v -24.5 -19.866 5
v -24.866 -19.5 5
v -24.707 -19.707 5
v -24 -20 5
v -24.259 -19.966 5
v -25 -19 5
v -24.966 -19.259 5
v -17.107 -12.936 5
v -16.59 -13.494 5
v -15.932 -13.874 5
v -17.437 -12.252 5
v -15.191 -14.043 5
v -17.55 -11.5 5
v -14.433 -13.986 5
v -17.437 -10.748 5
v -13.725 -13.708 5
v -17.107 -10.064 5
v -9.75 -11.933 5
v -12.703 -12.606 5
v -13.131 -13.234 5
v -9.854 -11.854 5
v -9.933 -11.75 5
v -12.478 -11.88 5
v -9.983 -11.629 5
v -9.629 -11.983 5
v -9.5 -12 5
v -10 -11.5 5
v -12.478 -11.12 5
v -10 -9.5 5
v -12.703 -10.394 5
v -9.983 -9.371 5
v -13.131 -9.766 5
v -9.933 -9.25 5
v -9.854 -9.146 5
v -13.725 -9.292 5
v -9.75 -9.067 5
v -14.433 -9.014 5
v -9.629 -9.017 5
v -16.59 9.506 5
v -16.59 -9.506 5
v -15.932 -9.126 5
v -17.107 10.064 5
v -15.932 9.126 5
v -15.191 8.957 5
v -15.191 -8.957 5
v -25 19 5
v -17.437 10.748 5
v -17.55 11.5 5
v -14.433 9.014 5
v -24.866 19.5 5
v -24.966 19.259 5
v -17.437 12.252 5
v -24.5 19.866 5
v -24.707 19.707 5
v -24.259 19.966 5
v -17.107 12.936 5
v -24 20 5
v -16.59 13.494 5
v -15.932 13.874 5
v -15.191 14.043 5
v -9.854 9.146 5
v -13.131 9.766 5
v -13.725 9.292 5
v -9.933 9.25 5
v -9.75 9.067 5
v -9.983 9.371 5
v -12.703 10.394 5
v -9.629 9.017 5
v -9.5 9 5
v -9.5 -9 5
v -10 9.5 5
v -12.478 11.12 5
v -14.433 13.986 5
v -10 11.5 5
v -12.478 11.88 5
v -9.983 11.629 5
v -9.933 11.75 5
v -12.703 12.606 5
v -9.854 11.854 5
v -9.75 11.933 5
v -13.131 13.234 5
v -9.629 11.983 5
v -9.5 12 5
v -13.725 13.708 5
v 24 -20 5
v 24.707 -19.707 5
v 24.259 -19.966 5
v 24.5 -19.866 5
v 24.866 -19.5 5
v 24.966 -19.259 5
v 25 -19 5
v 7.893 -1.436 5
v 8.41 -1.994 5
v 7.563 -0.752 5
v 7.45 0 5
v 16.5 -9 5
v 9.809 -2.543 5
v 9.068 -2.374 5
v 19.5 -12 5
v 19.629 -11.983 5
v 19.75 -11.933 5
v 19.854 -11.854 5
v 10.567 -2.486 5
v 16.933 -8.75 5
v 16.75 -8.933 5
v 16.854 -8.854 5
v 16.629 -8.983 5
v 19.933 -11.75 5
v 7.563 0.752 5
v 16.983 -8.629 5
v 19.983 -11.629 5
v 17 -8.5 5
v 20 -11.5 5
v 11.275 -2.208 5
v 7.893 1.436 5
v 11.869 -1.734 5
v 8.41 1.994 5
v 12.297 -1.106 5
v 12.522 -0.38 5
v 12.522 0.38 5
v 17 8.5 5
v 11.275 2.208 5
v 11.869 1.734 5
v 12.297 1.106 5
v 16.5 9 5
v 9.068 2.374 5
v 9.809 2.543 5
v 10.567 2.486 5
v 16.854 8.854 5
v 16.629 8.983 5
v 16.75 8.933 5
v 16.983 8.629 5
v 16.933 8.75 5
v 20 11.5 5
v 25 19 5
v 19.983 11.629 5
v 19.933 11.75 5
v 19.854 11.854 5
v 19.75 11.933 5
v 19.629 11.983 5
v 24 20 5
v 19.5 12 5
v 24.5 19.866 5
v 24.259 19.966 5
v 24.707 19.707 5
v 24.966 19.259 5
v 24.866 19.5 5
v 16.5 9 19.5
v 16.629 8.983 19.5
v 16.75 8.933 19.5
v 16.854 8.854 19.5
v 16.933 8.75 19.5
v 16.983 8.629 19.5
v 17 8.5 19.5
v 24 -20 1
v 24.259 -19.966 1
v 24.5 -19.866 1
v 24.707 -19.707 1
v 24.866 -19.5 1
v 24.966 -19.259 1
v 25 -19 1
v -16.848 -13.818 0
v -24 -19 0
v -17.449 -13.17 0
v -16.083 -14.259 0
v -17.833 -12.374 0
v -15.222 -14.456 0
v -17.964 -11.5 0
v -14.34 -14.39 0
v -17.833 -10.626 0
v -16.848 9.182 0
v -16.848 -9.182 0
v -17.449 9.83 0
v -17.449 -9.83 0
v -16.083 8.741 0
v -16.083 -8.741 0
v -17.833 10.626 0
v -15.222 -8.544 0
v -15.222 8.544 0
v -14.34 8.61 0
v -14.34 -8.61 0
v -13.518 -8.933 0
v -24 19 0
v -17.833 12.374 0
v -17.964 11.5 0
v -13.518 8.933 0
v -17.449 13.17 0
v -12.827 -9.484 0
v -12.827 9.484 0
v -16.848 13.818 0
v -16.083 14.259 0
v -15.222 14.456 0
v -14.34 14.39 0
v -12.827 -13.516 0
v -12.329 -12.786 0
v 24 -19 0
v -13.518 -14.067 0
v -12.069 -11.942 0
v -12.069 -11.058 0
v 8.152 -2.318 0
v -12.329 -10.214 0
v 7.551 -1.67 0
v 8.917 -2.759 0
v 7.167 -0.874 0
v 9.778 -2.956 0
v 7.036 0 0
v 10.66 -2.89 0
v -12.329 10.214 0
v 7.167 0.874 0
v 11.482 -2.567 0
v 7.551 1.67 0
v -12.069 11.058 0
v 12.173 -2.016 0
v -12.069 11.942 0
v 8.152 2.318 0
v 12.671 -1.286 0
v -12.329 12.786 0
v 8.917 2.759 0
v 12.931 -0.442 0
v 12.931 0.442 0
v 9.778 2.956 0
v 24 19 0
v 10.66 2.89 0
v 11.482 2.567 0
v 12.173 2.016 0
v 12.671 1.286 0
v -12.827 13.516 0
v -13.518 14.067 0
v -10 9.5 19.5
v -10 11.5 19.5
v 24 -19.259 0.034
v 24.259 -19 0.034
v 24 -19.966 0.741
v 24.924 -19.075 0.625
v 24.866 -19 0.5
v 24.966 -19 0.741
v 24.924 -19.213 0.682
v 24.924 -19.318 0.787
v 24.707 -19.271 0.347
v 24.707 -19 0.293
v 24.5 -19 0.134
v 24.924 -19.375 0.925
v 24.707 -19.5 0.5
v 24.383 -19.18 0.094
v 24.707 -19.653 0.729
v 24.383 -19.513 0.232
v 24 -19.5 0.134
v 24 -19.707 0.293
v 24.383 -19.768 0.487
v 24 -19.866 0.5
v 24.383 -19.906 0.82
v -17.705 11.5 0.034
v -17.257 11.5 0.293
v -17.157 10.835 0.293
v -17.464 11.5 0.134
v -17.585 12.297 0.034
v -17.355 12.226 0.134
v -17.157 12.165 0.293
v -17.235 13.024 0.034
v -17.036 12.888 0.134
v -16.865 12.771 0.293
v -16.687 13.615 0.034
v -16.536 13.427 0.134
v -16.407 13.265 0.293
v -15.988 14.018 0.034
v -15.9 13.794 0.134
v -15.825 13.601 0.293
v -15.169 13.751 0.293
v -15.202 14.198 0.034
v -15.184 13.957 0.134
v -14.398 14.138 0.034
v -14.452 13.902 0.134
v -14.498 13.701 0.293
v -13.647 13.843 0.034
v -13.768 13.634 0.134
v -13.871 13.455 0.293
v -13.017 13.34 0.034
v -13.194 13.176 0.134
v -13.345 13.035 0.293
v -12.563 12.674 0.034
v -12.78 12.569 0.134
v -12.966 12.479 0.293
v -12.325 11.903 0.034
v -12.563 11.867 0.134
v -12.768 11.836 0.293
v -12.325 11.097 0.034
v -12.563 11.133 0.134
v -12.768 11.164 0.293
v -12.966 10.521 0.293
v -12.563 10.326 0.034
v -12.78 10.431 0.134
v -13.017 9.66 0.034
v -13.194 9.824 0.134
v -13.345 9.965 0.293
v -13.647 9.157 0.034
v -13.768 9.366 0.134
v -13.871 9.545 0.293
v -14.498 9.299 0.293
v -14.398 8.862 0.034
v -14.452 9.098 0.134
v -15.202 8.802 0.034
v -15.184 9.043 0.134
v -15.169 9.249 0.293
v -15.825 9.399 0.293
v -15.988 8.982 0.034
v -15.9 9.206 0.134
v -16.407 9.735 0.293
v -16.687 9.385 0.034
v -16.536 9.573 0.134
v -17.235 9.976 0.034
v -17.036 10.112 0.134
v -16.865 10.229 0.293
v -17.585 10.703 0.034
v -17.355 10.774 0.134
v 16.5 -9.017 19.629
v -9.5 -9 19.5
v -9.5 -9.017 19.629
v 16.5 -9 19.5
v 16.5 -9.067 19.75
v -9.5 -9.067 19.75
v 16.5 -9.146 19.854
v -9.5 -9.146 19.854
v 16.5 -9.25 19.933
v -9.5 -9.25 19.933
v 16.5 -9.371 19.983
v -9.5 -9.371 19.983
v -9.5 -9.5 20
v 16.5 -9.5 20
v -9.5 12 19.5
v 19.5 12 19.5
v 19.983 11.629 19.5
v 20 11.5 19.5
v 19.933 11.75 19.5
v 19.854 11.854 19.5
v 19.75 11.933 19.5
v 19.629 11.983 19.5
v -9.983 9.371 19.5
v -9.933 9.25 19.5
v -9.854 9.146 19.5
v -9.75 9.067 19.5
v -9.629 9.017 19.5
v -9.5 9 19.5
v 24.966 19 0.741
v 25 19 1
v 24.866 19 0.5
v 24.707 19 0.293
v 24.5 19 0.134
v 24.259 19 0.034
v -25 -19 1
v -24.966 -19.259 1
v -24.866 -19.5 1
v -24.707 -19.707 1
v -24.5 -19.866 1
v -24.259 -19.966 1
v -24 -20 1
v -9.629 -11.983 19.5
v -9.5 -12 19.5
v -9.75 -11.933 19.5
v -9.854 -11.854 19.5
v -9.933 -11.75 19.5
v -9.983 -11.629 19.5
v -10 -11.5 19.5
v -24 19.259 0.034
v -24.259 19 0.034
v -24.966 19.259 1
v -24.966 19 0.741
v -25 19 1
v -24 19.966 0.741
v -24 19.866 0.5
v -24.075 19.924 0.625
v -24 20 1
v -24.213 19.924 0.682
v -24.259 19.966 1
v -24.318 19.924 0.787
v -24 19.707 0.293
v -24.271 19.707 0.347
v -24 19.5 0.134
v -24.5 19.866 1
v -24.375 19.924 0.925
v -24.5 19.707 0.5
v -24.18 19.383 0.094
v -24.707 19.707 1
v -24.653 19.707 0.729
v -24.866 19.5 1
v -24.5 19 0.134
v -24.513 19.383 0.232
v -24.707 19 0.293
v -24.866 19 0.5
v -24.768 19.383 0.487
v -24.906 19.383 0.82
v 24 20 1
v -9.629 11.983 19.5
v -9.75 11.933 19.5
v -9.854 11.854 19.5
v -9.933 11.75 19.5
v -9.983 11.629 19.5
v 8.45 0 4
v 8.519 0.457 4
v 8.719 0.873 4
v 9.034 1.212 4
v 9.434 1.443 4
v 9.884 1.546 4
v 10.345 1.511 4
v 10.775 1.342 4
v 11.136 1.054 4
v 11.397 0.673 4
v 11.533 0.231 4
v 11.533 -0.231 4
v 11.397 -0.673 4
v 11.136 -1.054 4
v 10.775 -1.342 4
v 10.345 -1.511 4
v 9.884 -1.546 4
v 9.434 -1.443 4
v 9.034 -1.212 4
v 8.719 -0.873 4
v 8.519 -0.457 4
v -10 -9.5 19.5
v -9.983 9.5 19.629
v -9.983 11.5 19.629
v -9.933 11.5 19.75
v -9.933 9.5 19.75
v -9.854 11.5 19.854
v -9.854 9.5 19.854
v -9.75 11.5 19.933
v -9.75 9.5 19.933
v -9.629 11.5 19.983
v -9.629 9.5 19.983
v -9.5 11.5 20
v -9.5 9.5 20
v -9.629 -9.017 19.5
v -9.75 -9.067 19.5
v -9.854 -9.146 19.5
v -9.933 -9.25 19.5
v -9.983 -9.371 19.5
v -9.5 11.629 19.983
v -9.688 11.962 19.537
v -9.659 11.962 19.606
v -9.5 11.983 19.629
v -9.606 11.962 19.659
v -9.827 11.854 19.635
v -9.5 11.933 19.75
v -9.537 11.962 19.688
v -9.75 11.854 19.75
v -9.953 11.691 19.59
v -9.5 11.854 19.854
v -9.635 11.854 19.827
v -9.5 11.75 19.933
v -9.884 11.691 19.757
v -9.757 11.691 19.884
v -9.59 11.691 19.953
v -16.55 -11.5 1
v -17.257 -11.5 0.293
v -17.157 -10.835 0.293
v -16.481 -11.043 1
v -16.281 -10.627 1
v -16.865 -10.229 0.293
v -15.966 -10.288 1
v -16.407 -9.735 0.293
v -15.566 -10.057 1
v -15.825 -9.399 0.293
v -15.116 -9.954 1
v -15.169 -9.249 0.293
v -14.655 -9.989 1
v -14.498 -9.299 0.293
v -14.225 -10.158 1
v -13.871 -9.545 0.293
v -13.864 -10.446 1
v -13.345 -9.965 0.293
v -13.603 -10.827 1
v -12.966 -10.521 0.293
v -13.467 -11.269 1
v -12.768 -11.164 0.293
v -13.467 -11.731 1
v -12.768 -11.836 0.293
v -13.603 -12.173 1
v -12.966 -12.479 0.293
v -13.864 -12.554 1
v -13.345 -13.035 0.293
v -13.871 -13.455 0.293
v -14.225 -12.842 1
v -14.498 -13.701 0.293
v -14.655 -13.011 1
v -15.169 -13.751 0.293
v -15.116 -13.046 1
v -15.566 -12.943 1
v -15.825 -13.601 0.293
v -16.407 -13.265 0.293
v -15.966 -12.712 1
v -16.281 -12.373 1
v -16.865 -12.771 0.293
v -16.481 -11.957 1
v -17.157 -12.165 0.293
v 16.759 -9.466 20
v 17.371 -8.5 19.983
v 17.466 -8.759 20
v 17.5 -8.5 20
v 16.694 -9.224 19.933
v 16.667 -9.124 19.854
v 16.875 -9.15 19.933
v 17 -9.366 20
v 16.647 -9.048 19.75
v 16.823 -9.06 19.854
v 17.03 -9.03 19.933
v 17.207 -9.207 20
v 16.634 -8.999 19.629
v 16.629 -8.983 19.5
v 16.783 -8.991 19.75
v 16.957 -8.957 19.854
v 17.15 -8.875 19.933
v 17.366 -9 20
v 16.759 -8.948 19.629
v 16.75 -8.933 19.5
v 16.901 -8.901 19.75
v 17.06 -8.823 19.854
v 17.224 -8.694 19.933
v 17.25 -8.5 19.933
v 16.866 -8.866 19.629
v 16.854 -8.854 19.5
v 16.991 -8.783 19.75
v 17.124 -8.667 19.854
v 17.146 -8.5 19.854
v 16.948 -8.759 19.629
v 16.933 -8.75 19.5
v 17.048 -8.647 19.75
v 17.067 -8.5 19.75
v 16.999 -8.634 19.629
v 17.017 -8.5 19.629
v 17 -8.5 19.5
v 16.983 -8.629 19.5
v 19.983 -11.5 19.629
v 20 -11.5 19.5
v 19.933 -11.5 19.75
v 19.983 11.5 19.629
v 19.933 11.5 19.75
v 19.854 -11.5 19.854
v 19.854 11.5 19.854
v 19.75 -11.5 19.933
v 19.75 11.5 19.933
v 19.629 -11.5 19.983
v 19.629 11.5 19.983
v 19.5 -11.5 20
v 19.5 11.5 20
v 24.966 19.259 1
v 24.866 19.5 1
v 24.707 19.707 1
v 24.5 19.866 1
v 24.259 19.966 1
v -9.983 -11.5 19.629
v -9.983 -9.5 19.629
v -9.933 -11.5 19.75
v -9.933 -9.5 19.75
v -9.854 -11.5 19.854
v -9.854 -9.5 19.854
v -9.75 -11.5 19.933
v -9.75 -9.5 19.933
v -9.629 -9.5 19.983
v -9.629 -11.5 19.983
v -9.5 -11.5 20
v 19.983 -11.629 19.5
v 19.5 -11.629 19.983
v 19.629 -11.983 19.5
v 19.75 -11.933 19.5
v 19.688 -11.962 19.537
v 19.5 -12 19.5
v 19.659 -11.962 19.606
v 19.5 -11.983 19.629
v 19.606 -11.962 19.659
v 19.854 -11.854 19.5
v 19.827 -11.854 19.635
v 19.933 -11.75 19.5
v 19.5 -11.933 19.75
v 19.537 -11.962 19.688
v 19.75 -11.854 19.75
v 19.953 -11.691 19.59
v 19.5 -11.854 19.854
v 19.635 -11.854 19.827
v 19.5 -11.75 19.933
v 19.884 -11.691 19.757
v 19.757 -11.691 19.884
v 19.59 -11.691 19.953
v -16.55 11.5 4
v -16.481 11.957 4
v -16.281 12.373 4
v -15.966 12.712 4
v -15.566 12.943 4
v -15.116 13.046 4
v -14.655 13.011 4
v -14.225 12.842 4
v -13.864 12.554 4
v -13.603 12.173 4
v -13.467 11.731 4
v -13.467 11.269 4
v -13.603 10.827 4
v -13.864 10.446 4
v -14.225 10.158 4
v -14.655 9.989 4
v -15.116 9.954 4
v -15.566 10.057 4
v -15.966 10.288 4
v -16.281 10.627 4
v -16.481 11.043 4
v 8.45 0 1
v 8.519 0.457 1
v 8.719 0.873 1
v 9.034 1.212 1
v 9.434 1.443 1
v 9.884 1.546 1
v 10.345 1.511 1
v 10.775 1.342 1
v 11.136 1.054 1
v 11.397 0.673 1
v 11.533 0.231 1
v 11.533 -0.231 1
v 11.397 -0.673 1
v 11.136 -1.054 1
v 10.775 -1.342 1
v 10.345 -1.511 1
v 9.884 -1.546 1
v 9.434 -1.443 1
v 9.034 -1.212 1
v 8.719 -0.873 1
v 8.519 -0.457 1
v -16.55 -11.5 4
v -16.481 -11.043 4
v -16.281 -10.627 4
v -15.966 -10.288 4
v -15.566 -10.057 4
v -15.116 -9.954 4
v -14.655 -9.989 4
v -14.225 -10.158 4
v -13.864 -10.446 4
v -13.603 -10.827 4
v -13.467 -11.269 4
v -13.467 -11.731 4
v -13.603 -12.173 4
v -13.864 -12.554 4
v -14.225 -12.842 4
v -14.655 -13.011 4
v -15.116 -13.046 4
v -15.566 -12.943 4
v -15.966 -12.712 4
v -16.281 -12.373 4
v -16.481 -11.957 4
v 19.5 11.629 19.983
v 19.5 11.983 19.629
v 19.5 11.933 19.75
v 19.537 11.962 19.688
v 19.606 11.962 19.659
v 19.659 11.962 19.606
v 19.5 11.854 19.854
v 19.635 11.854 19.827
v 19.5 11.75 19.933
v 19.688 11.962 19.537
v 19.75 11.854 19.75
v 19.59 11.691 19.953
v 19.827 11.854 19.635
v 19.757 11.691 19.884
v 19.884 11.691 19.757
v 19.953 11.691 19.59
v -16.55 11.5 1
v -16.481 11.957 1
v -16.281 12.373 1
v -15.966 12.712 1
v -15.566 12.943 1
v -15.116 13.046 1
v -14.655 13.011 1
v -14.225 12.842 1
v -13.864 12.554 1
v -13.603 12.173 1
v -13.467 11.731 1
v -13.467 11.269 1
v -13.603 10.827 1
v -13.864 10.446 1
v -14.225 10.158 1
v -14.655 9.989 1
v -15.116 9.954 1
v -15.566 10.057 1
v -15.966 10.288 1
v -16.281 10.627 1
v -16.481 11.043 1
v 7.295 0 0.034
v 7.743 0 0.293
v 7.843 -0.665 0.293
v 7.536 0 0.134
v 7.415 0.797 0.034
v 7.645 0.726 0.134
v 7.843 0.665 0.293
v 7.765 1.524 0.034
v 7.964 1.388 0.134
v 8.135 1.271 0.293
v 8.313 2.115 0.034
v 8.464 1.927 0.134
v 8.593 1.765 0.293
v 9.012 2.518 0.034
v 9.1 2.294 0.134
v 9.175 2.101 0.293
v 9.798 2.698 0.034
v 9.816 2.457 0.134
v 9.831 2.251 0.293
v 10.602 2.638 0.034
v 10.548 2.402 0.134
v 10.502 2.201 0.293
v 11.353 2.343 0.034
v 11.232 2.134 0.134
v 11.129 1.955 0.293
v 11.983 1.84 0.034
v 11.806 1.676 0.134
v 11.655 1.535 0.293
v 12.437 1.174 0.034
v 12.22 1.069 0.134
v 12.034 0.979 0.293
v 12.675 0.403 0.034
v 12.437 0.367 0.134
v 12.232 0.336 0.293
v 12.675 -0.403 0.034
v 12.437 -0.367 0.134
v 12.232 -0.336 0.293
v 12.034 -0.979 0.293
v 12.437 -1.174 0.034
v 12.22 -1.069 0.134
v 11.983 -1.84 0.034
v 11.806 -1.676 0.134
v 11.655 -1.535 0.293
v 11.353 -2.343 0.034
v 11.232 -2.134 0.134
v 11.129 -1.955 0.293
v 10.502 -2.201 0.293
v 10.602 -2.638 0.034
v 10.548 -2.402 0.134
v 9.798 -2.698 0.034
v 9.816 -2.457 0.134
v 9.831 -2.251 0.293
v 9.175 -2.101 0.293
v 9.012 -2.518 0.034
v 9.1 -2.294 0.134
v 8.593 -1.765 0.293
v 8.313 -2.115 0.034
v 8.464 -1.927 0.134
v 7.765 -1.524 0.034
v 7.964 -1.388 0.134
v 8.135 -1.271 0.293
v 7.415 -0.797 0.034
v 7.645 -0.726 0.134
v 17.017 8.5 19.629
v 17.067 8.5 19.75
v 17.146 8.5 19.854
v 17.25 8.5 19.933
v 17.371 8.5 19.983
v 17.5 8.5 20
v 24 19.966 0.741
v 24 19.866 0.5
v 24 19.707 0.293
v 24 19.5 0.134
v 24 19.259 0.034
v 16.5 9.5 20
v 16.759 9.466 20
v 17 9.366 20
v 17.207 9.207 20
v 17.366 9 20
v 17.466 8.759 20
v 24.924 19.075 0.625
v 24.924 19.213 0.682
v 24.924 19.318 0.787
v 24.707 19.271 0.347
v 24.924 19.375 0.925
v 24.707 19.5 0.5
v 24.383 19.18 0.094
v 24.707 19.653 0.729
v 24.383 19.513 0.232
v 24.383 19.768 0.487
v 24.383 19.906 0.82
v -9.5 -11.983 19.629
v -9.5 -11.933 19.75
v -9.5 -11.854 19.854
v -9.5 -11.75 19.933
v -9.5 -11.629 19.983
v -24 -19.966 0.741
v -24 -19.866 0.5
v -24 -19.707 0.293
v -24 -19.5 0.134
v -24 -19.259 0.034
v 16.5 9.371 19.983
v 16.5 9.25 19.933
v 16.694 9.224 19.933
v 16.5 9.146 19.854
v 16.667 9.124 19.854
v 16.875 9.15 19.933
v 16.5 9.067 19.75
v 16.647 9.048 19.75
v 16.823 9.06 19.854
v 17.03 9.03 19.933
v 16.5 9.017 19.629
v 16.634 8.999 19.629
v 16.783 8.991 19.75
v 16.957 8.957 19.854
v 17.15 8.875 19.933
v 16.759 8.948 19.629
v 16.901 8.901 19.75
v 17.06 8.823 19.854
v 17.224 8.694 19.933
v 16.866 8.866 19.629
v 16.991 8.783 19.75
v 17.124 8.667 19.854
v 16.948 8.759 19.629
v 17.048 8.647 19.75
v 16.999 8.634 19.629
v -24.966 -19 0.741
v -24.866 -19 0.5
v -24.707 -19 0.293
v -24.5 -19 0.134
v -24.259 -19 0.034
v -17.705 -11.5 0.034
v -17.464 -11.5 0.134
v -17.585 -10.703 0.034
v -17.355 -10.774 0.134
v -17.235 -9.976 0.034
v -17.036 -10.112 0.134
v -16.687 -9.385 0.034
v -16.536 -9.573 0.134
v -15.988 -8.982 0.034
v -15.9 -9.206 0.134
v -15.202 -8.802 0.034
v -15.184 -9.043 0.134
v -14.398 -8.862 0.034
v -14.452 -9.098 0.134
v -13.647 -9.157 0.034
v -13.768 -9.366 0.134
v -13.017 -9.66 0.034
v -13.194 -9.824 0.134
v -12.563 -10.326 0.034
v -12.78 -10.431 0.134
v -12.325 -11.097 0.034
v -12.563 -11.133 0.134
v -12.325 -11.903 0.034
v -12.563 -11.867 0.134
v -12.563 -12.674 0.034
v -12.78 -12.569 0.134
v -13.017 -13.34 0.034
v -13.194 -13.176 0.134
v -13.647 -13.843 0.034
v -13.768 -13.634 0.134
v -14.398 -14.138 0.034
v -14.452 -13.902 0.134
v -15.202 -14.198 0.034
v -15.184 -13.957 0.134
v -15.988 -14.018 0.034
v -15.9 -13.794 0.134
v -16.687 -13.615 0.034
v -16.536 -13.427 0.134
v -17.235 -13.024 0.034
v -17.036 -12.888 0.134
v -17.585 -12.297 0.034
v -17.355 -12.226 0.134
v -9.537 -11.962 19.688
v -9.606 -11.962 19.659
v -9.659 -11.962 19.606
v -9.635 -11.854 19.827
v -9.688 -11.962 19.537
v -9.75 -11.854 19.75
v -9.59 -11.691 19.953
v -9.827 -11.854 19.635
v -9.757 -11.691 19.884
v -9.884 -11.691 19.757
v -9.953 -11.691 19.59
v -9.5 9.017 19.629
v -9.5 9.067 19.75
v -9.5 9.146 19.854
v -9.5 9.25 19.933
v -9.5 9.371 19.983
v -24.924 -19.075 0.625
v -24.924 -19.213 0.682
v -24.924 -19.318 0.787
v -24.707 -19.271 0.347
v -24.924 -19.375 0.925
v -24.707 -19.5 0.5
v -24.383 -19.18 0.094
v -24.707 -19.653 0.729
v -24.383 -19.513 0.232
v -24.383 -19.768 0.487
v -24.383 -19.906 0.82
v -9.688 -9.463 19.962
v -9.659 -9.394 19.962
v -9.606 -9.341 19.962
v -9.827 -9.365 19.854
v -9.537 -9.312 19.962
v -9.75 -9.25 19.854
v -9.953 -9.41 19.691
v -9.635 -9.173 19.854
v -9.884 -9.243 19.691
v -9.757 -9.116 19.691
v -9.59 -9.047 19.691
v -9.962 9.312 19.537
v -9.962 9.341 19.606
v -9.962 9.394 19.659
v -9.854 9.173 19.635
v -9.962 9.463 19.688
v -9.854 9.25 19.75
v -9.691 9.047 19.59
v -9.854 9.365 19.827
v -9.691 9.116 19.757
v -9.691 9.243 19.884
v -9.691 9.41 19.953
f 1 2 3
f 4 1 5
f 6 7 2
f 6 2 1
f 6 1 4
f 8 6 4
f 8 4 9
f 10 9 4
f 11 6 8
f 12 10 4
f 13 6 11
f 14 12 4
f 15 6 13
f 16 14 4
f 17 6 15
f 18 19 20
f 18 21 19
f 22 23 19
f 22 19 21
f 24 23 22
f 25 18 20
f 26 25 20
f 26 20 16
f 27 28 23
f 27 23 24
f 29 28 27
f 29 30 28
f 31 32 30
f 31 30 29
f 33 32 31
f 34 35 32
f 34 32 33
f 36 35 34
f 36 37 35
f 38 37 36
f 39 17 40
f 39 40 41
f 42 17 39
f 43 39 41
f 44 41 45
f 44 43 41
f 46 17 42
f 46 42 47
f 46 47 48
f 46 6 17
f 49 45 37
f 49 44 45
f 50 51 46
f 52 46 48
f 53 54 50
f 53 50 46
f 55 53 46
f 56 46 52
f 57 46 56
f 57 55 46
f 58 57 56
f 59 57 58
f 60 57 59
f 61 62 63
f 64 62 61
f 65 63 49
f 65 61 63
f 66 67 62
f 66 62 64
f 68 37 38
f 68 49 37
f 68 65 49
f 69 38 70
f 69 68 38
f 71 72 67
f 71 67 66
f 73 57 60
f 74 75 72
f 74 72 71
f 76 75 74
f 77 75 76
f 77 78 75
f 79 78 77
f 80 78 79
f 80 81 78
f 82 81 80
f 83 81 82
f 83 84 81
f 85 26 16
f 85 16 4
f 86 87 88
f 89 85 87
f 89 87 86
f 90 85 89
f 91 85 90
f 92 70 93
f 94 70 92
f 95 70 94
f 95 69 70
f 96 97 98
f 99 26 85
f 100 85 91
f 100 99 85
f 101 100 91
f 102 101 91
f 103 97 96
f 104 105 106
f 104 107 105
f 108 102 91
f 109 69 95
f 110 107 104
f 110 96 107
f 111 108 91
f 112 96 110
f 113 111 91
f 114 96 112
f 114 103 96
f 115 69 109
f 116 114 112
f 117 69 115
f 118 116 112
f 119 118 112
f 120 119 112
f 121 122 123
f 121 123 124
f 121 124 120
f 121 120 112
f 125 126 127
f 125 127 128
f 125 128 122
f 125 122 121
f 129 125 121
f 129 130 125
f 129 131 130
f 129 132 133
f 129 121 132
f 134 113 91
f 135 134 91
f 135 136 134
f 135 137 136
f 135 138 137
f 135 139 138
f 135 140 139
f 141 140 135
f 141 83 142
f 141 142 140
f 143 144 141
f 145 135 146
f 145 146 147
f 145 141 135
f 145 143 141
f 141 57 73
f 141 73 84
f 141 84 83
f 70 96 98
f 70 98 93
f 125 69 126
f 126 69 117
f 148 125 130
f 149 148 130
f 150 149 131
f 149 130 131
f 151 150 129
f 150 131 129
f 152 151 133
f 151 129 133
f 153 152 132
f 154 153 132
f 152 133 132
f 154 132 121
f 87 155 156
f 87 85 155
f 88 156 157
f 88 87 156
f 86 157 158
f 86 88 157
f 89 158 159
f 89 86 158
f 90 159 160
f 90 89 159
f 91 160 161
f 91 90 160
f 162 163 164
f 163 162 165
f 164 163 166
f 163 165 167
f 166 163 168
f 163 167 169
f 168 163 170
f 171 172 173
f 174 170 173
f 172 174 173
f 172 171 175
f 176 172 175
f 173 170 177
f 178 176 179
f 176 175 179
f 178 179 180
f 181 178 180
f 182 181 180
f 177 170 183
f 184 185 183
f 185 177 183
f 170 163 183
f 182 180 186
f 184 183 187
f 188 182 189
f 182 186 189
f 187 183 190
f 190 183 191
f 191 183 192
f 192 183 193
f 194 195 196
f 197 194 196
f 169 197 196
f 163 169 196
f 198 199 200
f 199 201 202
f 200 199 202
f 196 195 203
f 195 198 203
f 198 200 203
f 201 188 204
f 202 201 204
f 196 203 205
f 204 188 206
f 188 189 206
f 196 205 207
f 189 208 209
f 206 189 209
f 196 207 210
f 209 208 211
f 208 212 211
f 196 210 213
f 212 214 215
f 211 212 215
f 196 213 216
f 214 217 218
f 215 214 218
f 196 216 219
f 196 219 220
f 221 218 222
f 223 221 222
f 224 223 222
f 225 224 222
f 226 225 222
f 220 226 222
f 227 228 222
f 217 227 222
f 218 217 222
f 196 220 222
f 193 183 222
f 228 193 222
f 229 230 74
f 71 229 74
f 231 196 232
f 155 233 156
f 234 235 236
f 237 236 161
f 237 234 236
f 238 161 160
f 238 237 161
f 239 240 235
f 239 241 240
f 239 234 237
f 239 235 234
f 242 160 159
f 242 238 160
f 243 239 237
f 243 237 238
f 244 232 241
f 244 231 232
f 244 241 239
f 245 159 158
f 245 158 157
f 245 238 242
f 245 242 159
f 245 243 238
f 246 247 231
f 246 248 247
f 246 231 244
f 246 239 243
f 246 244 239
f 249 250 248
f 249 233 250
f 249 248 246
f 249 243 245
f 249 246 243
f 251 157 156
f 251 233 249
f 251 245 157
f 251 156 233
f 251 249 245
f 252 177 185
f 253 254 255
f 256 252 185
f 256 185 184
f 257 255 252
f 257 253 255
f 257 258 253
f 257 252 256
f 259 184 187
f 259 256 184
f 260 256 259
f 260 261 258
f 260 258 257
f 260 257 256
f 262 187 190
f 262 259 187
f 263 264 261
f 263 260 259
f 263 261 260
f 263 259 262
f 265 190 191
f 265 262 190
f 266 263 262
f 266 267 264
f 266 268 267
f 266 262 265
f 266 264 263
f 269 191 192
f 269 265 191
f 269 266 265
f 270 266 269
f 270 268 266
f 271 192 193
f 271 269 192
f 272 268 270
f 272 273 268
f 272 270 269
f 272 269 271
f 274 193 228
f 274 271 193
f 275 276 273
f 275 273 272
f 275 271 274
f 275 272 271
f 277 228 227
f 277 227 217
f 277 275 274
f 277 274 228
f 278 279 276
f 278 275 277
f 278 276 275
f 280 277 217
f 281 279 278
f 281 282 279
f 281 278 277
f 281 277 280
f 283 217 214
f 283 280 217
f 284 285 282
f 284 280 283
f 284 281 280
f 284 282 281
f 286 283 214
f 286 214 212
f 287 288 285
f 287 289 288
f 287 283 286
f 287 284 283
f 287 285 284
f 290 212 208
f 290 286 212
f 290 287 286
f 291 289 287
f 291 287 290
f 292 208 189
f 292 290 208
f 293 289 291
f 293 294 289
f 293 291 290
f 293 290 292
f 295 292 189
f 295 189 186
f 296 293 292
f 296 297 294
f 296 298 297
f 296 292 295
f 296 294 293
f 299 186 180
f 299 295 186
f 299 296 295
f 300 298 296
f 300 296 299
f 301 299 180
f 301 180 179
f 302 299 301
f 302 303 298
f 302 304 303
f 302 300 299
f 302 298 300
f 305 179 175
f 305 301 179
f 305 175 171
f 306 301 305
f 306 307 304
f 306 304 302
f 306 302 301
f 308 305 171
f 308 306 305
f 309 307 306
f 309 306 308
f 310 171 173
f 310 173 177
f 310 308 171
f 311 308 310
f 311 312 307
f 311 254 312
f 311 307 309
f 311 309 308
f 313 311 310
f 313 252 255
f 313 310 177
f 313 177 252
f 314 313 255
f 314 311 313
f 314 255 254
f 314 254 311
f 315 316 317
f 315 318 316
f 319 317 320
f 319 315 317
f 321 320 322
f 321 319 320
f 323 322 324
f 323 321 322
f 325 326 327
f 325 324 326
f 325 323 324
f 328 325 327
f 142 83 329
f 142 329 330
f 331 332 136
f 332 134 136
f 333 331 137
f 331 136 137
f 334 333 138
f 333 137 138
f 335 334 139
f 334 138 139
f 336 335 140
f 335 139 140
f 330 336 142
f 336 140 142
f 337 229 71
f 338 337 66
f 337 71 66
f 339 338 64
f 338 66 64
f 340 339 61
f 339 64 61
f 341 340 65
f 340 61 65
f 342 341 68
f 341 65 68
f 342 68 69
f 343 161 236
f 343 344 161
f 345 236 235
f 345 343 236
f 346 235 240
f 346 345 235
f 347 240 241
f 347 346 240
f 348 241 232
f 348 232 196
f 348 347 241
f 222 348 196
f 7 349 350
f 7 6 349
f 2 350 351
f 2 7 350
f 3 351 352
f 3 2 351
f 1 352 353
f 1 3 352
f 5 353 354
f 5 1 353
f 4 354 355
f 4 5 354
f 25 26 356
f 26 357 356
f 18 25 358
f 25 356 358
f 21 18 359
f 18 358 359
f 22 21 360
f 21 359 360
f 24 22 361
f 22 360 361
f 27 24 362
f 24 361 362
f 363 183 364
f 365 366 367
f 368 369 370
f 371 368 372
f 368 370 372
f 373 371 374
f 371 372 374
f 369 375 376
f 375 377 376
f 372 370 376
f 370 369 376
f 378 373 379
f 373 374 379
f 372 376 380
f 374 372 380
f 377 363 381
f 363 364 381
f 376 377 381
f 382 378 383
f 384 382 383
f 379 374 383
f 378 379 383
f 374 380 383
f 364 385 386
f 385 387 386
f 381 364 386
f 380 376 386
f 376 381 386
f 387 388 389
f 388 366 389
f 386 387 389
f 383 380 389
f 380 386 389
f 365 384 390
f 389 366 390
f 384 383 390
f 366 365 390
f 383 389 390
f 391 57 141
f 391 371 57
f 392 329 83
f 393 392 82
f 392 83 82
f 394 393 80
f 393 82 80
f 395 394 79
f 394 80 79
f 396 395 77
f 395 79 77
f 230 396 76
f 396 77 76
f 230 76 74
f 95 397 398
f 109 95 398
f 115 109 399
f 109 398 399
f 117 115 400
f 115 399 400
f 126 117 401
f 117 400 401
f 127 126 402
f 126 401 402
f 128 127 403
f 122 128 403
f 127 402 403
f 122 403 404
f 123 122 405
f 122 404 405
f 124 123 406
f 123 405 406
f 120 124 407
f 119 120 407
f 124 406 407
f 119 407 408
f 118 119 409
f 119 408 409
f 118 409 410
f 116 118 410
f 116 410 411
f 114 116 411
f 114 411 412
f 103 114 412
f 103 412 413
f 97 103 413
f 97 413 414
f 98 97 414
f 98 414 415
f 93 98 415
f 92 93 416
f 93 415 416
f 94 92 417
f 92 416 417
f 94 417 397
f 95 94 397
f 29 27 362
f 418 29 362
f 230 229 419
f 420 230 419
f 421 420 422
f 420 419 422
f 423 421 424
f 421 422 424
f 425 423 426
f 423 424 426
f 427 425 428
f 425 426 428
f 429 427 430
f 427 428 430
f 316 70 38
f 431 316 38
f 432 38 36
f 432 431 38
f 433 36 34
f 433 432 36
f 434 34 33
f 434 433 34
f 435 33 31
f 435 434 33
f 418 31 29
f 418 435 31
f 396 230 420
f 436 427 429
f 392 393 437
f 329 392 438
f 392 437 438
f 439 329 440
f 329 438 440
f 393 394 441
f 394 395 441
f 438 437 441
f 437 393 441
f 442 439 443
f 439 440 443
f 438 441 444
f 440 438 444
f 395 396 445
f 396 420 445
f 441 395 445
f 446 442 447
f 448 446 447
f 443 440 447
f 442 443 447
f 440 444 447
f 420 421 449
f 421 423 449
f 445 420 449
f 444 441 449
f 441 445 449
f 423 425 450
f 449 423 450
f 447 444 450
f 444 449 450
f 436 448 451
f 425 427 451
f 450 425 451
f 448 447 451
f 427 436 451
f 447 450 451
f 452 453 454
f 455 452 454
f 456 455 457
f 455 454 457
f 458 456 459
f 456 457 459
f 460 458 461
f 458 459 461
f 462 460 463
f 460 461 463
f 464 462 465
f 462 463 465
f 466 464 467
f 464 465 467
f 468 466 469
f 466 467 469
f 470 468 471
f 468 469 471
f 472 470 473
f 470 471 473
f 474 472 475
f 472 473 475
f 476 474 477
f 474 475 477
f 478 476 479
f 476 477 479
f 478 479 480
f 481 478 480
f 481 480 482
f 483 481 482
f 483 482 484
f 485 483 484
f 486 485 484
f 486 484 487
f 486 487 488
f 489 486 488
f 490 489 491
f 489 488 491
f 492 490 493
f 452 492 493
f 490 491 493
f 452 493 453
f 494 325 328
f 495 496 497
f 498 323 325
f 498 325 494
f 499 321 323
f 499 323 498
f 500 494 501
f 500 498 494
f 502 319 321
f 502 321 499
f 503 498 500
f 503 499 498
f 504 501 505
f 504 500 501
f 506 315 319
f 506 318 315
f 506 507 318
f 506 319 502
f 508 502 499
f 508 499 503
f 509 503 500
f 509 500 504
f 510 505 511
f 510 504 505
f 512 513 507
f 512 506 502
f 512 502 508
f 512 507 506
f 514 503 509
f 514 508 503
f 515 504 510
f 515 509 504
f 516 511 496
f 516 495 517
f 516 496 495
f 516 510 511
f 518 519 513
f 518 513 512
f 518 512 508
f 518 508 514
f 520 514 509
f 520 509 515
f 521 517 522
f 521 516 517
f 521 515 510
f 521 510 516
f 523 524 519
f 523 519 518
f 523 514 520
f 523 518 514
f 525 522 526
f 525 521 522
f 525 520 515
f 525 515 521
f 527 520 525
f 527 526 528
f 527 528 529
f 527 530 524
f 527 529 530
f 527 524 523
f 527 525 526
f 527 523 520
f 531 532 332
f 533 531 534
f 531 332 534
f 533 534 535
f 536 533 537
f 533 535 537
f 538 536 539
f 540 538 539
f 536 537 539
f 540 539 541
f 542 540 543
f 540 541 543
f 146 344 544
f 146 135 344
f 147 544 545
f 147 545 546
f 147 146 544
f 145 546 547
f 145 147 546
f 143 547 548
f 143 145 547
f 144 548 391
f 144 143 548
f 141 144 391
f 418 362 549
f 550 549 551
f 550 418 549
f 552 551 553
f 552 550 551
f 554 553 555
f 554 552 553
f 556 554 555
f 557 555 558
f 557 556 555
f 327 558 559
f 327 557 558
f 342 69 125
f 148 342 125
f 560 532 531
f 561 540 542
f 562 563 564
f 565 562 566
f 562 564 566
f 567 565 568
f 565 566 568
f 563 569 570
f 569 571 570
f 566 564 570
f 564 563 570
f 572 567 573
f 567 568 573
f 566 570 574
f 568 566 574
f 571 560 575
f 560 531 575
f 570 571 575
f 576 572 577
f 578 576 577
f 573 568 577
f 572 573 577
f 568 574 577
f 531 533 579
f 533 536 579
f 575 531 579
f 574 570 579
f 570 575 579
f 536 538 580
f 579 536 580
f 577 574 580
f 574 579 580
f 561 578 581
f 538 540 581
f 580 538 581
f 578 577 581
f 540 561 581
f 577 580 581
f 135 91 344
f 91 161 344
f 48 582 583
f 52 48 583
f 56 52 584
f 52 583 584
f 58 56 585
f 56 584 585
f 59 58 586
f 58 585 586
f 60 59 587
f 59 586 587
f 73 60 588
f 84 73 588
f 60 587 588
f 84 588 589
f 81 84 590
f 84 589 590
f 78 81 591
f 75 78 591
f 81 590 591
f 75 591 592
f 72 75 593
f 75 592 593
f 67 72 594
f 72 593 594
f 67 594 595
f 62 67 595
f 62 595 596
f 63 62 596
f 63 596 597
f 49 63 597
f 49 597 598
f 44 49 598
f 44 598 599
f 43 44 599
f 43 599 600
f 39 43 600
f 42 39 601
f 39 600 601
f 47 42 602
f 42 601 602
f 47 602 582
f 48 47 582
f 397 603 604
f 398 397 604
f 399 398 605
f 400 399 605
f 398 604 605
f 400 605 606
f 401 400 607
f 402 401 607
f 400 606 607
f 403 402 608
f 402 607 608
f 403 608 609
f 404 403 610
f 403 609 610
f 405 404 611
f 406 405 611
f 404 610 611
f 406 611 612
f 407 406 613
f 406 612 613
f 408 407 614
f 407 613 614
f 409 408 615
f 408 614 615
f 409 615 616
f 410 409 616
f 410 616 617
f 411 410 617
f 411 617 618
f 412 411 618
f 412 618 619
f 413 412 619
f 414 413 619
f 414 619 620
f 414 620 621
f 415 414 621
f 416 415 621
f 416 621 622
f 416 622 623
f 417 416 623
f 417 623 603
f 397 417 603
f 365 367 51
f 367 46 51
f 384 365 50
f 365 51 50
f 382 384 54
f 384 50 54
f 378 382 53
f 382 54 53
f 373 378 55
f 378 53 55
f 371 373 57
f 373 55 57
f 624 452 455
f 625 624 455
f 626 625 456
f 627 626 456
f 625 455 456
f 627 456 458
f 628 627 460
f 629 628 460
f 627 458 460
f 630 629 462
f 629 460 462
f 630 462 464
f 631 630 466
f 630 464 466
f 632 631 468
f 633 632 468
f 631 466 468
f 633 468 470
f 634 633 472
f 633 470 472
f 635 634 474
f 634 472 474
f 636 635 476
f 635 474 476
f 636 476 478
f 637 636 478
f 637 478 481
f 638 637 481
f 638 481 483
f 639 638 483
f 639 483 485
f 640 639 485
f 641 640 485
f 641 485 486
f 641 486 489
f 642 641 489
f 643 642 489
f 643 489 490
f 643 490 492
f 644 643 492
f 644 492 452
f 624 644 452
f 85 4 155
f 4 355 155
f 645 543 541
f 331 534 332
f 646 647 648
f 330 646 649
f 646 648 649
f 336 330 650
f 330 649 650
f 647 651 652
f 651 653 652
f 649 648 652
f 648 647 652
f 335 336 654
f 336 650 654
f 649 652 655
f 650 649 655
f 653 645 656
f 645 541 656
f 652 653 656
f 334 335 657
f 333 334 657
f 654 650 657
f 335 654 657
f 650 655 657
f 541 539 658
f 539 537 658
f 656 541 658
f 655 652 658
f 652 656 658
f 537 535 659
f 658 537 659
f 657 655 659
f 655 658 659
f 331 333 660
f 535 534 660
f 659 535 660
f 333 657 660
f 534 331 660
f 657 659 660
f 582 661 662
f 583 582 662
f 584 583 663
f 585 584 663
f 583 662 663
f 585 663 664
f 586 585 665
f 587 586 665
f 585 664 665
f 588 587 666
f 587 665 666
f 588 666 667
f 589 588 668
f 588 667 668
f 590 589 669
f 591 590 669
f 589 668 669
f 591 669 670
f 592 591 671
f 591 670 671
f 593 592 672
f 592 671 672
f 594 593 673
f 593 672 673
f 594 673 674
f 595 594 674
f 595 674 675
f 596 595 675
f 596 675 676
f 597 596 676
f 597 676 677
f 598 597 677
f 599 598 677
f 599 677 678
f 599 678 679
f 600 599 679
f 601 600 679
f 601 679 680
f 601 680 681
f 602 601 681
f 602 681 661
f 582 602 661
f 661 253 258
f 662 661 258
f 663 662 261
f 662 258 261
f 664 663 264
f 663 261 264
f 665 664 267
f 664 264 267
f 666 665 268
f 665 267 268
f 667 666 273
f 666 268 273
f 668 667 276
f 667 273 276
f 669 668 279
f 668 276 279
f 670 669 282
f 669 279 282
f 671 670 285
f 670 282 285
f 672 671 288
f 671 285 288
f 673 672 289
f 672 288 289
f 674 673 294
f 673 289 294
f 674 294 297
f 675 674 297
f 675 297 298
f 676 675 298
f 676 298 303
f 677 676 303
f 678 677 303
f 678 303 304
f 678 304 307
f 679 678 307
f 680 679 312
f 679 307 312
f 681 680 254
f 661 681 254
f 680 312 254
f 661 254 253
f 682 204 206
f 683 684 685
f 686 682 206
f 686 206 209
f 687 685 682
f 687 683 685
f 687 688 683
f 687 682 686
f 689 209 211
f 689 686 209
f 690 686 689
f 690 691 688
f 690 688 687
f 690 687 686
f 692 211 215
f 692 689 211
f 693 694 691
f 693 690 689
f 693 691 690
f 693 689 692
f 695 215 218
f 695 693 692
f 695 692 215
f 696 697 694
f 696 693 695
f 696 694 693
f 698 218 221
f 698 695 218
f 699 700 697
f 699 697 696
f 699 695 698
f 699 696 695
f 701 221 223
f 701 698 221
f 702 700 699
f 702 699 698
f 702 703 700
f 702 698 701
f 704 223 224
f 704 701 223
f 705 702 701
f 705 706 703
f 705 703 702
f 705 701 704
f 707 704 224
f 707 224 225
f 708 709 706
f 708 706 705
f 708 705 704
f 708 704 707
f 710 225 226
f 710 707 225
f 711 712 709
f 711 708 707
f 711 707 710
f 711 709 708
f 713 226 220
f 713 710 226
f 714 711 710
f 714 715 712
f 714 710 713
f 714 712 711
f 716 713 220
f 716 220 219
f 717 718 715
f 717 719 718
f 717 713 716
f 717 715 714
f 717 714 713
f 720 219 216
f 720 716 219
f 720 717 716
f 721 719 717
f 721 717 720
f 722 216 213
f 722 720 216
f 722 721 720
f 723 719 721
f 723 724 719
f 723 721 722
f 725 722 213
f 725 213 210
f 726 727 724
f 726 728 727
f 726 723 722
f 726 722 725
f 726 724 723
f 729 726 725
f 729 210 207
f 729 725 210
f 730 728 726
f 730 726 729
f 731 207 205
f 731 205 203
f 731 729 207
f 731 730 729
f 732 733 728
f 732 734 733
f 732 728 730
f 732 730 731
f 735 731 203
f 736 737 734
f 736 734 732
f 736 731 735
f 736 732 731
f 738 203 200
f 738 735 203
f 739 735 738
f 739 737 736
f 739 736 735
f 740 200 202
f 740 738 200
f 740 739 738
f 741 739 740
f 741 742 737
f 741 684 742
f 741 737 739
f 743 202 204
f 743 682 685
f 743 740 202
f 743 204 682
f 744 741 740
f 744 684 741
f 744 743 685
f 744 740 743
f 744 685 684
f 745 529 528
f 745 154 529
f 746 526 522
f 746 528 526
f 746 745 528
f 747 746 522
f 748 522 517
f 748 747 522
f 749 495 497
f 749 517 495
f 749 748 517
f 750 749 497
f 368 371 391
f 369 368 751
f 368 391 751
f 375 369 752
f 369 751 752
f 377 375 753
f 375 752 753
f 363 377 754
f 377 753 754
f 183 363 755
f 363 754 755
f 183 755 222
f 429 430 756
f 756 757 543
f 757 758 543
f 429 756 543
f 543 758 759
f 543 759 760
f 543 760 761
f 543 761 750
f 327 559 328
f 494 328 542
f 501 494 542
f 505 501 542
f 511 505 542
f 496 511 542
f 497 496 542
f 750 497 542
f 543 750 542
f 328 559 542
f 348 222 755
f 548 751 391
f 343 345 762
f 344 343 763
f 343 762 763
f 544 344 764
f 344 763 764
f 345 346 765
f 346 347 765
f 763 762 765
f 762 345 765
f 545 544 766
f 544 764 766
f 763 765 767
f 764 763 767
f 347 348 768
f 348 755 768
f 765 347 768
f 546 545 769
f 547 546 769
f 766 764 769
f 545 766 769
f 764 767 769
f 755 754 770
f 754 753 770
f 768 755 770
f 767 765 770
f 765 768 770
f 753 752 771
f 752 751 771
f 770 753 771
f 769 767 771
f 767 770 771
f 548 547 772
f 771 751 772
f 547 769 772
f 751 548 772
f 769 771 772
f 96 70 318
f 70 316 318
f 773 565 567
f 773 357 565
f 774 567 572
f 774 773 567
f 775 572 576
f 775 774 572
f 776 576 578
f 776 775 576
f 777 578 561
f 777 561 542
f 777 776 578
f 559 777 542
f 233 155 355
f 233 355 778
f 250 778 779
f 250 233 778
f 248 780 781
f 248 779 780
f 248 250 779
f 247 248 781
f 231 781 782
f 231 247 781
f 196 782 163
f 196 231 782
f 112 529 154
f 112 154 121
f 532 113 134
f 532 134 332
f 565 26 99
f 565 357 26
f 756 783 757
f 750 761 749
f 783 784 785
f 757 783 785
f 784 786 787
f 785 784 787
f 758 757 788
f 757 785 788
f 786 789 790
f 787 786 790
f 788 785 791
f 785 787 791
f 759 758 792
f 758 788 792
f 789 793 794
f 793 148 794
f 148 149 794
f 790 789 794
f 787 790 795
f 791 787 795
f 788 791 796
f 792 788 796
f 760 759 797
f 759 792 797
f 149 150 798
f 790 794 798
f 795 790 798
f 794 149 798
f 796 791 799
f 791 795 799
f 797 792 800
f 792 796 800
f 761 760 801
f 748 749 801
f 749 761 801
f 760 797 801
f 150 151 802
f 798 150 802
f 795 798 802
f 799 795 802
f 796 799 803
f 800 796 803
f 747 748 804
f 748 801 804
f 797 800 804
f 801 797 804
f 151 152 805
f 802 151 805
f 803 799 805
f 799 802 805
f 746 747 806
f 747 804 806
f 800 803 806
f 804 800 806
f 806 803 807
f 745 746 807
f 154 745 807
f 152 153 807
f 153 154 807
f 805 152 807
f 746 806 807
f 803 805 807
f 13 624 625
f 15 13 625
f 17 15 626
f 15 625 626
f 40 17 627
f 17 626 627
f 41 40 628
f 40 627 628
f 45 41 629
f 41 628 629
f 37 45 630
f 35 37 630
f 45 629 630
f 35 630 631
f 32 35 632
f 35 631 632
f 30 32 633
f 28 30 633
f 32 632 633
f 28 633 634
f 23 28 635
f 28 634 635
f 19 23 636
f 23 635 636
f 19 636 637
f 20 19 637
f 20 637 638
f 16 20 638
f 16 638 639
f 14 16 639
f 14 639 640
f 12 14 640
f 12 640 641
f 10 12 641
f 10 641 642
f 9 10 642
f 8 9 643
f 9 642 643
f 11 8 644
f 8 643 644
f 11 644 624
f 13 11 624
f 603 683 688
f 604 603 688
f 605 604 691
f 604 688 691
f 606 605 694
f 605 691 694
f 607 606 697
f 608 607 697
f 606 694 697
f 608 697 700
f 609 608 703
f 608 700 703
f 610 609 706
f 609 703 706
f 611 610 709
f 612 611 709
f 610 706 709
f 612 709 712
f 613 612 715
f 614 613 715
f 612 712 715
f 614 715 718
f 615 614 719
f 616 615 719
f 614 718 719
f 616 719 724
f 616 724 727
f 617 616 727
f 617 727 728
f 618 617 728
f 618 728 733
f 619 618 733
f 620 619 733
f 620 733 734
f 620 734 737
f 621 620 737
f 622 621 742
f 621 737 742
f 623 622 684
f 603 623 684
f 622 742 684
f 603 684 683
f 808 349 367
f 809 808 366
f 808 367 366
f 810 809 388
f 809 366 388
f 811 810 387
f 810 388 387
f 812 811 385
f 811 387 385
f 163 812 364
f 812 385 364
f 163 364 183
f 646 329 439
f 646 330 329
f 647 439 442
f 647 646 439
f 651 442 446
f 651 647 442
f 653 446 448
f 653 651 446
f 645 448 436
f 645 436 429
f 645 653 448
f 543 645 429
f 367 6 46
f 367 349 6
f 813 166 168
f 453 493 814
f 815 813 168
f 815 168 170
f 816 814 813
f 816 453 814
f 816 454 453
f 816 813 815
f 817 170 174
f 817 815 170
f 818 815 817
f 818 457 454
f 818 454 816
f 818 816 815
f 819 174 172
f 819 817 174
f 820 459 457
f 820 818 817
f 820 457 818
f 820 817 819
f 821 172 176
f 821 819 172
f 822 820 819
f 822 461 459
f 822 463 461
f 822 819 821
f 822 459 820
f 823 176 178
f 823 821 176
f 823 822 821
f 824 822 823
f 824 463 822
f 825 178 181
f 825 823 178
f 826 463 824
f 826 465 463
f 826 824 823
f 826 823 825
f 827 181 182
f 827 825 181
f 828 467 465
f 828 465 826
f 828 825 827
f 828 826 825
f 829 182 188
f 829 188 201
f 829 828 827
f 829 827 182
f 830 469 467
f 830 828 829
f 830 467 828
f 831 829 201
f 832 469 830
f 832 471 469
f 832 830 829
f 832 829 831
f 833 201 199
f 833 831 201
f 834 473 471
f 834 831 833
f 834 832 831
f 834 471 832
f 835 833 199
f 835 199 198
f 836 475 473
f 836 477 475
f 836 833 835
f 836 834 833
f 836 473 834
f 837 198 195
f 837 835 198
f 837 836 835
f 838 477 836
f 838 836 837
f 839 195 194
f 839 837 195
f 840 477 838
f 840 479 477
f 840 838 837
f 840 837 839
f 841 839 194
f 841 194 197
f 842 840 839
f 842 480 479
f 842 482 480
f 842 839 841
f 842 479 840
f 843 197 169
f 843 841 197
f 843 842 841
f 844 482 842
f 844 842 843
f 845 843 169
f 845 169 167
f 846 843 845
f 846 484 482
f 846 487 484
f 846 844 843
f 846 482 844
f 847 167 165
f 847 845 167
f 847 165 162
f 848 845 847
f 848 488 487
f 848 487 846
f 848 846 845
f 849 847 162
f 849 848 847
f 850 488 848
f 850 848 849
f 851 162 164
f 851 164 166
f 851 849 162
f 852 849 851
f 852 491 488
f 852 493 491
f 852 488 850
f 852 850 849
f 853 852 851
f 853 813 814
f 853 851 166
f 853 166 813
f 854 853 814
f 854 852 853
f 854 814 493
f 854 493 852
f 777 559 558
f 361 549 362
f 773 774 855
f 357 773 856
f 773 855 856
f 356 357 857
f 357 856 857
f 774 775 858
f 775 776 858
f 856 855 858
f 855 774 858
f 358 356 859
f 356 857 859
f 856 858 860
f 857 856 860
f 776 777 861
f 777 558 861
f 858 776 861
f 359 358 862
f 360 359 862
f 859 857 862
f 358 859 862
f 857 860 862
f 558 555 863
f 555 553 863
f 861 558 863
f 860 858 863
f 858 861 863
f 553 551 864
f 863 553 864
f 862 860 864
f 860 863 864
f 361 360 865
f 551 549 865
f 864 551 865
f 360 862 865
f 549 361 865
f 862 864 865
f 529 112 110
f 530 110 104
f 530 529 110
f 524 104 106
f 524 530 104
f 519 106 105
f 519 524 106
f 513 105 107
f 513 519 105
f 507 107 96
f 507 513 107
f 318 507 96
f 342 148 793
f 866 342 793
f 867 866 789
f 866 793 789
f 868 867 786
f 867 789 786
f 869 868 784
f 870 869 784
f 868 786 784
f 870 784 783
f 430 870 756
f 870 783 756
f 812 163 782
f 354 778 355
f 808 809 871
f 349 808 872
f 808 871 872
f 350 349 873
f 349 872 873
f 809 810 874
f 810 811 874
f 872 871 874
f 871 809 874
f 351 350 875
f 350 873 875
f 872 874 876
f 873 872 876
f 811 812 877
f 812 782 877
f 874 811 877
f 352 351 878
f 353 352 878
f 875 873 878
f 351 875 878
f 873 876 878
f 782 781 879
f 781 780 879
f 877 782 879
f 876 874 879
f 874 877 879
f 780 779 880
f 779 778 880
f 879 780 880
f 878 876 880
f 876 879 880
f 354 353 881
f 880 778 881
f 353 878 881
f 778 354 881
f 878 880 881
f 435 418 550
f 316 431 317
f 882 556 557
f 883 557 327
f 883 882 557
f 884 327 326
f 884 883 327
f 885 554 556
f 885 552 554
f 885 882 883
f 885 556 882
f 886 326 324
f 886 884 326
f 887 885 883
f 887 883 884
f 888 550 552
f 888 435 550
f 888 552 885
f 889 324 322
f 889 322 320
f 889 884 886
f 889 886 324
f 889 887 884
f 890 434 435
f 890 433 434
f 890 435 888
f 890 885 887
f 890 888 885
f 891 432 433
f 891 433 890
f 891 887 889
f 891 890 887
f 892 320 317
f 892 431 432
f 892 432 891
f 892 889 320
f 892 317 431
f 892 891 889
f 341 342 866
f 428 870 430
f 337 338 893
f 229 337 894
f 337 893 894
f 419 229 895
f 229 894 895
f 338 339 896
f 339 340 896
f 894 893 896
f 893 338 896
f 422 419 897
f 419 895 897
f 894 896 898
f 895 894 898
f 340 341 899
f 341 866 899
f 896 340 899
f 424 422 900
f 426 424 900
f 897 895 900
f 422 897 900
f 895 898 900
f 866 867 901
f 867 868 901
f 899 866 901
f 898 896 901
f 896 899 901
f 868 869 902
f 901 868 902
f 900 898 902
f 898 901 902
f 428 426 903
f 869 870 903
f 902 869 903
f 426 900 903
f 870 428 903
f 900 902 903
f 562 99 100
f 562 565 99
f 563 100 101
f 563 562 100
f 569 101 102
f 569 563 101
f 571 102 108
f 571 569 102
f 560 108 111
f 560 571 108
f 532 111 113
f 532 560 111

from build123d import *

# Parameters (mm, degrees)
SKETCH_2_W          = 50
SKETCH_2_H          = 40
EXTRUDE_1_DEPTH     = 5
EXTRUDE_START       = -8
SKETCH_5_W          = 30
SKETCH_5_H          = 15
EXTRUDE_2_DEPTH     = 3
SKETCH_6_W          = 30
SKETCH_6_H          = 15
EXTRUDE_3_DEPTH     = 3
CUT_EXTRUDE_1_REACH = 39.749
SKETCH_7_R          = 1.55
SKETCH_8_W          = 15
SKETCH_8_H          = 21
EXTRUDE_4_DEPTH     = 3
FILLET_4_R          = 0.5
CHAMFER_1_SIZE      = 1
FILLET_3_R          = 1


with BuildPart() as part:
    # 草图2 → 凸台-拉伸1 (new body)
    with BuildSketch(Plane.XY):
        Rectangle(SKETCH_2_W, SKETCH_2_H)
    extrude(amount=EXTRUDE_1_DEPTH)

    # 草图5 → 凸台-拉伸2 (add)
    with BuildSketch(Plane.XZ.offset(20).offset(EXTRUDE_START)):
        with Locations((5, 12.5)):
            Rectangle(SKETCH_5_W, SKETCH_5_H)
    extrude(amount=-EXTRUDE_2_DEPTH)

    # 草图6 → 凸台-拉伸3 (add)
    with BuildSketch(Plane(origin=(0, 20, 0), x_dir=(1, 0, 0), z_dir=(0, 1, 0)).offset(EXTRUDE_START)):
        with Locations((5, -12.5)):
            Rectangle(SKETCH_6_W, SKETCH_6_H)
    extrude(amount=-EXTRUDE_3_DEPTH)

    # 草图7 → 切除-拉伸1 (cut, up to next)
    with BuildSketch(Plane(origin=(0, 0, 0), x_dir=(-1, 0, 0), z_dir=(0, 0, -1)), mode=Mode.PRIVATE) as cut_extrude_1_sk1:
        with Locations((-10, 0)):
            Circle(SKETCH_7_R)
    cut_extrude_1_tool1 = extrude(cut_extrude_1_sk1.sketch, amount=-CUT_EXTRUDE_1_REACH, mode=Mode.PRIVATE) & part.part
    # 草图7 → 切除-拉伸1 (cut, up to next)
    with BuildSketch(Plane(origin=(0, 0, 0), x_dir=(-1, 0, 0), z_dir=(0, 0, -1)), mode=Mode.PRIVATE) as cut_extrude_1_sk2:
        with Locations((15, -11.5)):
            Circle(SKETCH_7_R)
    cut_extrude_1_tool2 = extrude(cut_extrude_1_sk2.sketch, amount=-CUT_EXTRUDE_1_REACH, mode=Mode.PRIVATE) & part.part
    # 草图7 → 切除-拉伸1 (cut, up to next)
    with BuildSketch(Plane(origin=(0, 0, 0), x_dir=(-1, 0, 0), z_dir=(0, 0, -1)), mode=Mode.PRIVATE) as cut_extrude_1_sk3:
        with Locations((15, 11.5)):
            Circle(SKETCH_7_R)
    cut_extrude_1_tool3 = extrude(cut_extrude_1_sk3.sketch, amount=-CUT_EXTRUDE_1_REACH, mode=Mode.PRIVATE) & part.part
    add(cut_extrude_1_tool1.solids().sort_by_distance((10, 0, 0))[0], mode=Mode.SUBTRACT)
    add(cut_extrude_1_tool2.solids().sort_by_distance((-15, -11.5, 0))[0], mode=Mode.SUBTRACT)
    add(cut_extrude_1_tool3.solids().sort_by_distance((-15, 11.5, 0))[0], mode=Mode.SUBTRACT)

    # 草图8 → 凸台-拉伸4 (add)
    with BuildSketch(Plane(origin=(20, 0, 0), x_dir=(0, 0, -1), z_dir=(1, 0, 0))):
        with Locations((-12.5, -1.5)):
            Rectangle(SKETCH_8_W, SKETCH_8_H)
    extrude(amount=-EXTRUDE_4_DEPTH)

    # 圆角4
    fillet_4_edges = [part.edges().sort_by_distance(p)[0] for p in [
        (-10, -9, 12.5),
        (-10, -10.5, 20),
        (20, 0, 20),
        (20, -12, 12.5),
        (5, -12, 20),
        (-10, -12, 12.5),
        (3.5, 9, 20),
        (-10, 9, 12.5),
        (-10, 10.5, 20),
        (-10, 12, 12.5),
        (5, 12, 20),
        (20, 12, 12.5),
        (3.5, -9, 20),
        (17, 0, 20),
        (17, -9, 12.5),
        (17, 9, 12.5),
    ]]
    fillet(fillet_4_edges, radius=FILLET_4_R)

    # 倒角1
    chamfer_1_edges = [part.edges().sort_by_distance(p)[0] for p in [
        (11.55, 0, 0),
        (11.55, 0, 5),
        (-13.45, -11.5, 0),
        (-13.45, -11.5, 5),
        (-13.45, 11.5, 0),
        (-13.45, 11.5, 5),
    ]]
    chamfer(chamfer_1_edges, length=CHAMFER_1_SIZE)

    # 圆角3
    fillet_3_edges = [part.edges().sort_by_distance(p)[0] for p in [
        (12.55, 0, 0),
        (-12.45, -11.5, 0),
        (-12.45, 11.5, 0),
        (0, -20, 0),
        (-25, 0, 0),
        (0, 20, 0),
        (25, 0, 0),
        (25, -20, 2.5),
        (-25, -20, 2.5),
        (-25, 20, 2.5),
        (25, 20, 2.5),
    ]]
    fillet(fillet_3_edges, radius=FILLET_3_R)


solid = part.part
